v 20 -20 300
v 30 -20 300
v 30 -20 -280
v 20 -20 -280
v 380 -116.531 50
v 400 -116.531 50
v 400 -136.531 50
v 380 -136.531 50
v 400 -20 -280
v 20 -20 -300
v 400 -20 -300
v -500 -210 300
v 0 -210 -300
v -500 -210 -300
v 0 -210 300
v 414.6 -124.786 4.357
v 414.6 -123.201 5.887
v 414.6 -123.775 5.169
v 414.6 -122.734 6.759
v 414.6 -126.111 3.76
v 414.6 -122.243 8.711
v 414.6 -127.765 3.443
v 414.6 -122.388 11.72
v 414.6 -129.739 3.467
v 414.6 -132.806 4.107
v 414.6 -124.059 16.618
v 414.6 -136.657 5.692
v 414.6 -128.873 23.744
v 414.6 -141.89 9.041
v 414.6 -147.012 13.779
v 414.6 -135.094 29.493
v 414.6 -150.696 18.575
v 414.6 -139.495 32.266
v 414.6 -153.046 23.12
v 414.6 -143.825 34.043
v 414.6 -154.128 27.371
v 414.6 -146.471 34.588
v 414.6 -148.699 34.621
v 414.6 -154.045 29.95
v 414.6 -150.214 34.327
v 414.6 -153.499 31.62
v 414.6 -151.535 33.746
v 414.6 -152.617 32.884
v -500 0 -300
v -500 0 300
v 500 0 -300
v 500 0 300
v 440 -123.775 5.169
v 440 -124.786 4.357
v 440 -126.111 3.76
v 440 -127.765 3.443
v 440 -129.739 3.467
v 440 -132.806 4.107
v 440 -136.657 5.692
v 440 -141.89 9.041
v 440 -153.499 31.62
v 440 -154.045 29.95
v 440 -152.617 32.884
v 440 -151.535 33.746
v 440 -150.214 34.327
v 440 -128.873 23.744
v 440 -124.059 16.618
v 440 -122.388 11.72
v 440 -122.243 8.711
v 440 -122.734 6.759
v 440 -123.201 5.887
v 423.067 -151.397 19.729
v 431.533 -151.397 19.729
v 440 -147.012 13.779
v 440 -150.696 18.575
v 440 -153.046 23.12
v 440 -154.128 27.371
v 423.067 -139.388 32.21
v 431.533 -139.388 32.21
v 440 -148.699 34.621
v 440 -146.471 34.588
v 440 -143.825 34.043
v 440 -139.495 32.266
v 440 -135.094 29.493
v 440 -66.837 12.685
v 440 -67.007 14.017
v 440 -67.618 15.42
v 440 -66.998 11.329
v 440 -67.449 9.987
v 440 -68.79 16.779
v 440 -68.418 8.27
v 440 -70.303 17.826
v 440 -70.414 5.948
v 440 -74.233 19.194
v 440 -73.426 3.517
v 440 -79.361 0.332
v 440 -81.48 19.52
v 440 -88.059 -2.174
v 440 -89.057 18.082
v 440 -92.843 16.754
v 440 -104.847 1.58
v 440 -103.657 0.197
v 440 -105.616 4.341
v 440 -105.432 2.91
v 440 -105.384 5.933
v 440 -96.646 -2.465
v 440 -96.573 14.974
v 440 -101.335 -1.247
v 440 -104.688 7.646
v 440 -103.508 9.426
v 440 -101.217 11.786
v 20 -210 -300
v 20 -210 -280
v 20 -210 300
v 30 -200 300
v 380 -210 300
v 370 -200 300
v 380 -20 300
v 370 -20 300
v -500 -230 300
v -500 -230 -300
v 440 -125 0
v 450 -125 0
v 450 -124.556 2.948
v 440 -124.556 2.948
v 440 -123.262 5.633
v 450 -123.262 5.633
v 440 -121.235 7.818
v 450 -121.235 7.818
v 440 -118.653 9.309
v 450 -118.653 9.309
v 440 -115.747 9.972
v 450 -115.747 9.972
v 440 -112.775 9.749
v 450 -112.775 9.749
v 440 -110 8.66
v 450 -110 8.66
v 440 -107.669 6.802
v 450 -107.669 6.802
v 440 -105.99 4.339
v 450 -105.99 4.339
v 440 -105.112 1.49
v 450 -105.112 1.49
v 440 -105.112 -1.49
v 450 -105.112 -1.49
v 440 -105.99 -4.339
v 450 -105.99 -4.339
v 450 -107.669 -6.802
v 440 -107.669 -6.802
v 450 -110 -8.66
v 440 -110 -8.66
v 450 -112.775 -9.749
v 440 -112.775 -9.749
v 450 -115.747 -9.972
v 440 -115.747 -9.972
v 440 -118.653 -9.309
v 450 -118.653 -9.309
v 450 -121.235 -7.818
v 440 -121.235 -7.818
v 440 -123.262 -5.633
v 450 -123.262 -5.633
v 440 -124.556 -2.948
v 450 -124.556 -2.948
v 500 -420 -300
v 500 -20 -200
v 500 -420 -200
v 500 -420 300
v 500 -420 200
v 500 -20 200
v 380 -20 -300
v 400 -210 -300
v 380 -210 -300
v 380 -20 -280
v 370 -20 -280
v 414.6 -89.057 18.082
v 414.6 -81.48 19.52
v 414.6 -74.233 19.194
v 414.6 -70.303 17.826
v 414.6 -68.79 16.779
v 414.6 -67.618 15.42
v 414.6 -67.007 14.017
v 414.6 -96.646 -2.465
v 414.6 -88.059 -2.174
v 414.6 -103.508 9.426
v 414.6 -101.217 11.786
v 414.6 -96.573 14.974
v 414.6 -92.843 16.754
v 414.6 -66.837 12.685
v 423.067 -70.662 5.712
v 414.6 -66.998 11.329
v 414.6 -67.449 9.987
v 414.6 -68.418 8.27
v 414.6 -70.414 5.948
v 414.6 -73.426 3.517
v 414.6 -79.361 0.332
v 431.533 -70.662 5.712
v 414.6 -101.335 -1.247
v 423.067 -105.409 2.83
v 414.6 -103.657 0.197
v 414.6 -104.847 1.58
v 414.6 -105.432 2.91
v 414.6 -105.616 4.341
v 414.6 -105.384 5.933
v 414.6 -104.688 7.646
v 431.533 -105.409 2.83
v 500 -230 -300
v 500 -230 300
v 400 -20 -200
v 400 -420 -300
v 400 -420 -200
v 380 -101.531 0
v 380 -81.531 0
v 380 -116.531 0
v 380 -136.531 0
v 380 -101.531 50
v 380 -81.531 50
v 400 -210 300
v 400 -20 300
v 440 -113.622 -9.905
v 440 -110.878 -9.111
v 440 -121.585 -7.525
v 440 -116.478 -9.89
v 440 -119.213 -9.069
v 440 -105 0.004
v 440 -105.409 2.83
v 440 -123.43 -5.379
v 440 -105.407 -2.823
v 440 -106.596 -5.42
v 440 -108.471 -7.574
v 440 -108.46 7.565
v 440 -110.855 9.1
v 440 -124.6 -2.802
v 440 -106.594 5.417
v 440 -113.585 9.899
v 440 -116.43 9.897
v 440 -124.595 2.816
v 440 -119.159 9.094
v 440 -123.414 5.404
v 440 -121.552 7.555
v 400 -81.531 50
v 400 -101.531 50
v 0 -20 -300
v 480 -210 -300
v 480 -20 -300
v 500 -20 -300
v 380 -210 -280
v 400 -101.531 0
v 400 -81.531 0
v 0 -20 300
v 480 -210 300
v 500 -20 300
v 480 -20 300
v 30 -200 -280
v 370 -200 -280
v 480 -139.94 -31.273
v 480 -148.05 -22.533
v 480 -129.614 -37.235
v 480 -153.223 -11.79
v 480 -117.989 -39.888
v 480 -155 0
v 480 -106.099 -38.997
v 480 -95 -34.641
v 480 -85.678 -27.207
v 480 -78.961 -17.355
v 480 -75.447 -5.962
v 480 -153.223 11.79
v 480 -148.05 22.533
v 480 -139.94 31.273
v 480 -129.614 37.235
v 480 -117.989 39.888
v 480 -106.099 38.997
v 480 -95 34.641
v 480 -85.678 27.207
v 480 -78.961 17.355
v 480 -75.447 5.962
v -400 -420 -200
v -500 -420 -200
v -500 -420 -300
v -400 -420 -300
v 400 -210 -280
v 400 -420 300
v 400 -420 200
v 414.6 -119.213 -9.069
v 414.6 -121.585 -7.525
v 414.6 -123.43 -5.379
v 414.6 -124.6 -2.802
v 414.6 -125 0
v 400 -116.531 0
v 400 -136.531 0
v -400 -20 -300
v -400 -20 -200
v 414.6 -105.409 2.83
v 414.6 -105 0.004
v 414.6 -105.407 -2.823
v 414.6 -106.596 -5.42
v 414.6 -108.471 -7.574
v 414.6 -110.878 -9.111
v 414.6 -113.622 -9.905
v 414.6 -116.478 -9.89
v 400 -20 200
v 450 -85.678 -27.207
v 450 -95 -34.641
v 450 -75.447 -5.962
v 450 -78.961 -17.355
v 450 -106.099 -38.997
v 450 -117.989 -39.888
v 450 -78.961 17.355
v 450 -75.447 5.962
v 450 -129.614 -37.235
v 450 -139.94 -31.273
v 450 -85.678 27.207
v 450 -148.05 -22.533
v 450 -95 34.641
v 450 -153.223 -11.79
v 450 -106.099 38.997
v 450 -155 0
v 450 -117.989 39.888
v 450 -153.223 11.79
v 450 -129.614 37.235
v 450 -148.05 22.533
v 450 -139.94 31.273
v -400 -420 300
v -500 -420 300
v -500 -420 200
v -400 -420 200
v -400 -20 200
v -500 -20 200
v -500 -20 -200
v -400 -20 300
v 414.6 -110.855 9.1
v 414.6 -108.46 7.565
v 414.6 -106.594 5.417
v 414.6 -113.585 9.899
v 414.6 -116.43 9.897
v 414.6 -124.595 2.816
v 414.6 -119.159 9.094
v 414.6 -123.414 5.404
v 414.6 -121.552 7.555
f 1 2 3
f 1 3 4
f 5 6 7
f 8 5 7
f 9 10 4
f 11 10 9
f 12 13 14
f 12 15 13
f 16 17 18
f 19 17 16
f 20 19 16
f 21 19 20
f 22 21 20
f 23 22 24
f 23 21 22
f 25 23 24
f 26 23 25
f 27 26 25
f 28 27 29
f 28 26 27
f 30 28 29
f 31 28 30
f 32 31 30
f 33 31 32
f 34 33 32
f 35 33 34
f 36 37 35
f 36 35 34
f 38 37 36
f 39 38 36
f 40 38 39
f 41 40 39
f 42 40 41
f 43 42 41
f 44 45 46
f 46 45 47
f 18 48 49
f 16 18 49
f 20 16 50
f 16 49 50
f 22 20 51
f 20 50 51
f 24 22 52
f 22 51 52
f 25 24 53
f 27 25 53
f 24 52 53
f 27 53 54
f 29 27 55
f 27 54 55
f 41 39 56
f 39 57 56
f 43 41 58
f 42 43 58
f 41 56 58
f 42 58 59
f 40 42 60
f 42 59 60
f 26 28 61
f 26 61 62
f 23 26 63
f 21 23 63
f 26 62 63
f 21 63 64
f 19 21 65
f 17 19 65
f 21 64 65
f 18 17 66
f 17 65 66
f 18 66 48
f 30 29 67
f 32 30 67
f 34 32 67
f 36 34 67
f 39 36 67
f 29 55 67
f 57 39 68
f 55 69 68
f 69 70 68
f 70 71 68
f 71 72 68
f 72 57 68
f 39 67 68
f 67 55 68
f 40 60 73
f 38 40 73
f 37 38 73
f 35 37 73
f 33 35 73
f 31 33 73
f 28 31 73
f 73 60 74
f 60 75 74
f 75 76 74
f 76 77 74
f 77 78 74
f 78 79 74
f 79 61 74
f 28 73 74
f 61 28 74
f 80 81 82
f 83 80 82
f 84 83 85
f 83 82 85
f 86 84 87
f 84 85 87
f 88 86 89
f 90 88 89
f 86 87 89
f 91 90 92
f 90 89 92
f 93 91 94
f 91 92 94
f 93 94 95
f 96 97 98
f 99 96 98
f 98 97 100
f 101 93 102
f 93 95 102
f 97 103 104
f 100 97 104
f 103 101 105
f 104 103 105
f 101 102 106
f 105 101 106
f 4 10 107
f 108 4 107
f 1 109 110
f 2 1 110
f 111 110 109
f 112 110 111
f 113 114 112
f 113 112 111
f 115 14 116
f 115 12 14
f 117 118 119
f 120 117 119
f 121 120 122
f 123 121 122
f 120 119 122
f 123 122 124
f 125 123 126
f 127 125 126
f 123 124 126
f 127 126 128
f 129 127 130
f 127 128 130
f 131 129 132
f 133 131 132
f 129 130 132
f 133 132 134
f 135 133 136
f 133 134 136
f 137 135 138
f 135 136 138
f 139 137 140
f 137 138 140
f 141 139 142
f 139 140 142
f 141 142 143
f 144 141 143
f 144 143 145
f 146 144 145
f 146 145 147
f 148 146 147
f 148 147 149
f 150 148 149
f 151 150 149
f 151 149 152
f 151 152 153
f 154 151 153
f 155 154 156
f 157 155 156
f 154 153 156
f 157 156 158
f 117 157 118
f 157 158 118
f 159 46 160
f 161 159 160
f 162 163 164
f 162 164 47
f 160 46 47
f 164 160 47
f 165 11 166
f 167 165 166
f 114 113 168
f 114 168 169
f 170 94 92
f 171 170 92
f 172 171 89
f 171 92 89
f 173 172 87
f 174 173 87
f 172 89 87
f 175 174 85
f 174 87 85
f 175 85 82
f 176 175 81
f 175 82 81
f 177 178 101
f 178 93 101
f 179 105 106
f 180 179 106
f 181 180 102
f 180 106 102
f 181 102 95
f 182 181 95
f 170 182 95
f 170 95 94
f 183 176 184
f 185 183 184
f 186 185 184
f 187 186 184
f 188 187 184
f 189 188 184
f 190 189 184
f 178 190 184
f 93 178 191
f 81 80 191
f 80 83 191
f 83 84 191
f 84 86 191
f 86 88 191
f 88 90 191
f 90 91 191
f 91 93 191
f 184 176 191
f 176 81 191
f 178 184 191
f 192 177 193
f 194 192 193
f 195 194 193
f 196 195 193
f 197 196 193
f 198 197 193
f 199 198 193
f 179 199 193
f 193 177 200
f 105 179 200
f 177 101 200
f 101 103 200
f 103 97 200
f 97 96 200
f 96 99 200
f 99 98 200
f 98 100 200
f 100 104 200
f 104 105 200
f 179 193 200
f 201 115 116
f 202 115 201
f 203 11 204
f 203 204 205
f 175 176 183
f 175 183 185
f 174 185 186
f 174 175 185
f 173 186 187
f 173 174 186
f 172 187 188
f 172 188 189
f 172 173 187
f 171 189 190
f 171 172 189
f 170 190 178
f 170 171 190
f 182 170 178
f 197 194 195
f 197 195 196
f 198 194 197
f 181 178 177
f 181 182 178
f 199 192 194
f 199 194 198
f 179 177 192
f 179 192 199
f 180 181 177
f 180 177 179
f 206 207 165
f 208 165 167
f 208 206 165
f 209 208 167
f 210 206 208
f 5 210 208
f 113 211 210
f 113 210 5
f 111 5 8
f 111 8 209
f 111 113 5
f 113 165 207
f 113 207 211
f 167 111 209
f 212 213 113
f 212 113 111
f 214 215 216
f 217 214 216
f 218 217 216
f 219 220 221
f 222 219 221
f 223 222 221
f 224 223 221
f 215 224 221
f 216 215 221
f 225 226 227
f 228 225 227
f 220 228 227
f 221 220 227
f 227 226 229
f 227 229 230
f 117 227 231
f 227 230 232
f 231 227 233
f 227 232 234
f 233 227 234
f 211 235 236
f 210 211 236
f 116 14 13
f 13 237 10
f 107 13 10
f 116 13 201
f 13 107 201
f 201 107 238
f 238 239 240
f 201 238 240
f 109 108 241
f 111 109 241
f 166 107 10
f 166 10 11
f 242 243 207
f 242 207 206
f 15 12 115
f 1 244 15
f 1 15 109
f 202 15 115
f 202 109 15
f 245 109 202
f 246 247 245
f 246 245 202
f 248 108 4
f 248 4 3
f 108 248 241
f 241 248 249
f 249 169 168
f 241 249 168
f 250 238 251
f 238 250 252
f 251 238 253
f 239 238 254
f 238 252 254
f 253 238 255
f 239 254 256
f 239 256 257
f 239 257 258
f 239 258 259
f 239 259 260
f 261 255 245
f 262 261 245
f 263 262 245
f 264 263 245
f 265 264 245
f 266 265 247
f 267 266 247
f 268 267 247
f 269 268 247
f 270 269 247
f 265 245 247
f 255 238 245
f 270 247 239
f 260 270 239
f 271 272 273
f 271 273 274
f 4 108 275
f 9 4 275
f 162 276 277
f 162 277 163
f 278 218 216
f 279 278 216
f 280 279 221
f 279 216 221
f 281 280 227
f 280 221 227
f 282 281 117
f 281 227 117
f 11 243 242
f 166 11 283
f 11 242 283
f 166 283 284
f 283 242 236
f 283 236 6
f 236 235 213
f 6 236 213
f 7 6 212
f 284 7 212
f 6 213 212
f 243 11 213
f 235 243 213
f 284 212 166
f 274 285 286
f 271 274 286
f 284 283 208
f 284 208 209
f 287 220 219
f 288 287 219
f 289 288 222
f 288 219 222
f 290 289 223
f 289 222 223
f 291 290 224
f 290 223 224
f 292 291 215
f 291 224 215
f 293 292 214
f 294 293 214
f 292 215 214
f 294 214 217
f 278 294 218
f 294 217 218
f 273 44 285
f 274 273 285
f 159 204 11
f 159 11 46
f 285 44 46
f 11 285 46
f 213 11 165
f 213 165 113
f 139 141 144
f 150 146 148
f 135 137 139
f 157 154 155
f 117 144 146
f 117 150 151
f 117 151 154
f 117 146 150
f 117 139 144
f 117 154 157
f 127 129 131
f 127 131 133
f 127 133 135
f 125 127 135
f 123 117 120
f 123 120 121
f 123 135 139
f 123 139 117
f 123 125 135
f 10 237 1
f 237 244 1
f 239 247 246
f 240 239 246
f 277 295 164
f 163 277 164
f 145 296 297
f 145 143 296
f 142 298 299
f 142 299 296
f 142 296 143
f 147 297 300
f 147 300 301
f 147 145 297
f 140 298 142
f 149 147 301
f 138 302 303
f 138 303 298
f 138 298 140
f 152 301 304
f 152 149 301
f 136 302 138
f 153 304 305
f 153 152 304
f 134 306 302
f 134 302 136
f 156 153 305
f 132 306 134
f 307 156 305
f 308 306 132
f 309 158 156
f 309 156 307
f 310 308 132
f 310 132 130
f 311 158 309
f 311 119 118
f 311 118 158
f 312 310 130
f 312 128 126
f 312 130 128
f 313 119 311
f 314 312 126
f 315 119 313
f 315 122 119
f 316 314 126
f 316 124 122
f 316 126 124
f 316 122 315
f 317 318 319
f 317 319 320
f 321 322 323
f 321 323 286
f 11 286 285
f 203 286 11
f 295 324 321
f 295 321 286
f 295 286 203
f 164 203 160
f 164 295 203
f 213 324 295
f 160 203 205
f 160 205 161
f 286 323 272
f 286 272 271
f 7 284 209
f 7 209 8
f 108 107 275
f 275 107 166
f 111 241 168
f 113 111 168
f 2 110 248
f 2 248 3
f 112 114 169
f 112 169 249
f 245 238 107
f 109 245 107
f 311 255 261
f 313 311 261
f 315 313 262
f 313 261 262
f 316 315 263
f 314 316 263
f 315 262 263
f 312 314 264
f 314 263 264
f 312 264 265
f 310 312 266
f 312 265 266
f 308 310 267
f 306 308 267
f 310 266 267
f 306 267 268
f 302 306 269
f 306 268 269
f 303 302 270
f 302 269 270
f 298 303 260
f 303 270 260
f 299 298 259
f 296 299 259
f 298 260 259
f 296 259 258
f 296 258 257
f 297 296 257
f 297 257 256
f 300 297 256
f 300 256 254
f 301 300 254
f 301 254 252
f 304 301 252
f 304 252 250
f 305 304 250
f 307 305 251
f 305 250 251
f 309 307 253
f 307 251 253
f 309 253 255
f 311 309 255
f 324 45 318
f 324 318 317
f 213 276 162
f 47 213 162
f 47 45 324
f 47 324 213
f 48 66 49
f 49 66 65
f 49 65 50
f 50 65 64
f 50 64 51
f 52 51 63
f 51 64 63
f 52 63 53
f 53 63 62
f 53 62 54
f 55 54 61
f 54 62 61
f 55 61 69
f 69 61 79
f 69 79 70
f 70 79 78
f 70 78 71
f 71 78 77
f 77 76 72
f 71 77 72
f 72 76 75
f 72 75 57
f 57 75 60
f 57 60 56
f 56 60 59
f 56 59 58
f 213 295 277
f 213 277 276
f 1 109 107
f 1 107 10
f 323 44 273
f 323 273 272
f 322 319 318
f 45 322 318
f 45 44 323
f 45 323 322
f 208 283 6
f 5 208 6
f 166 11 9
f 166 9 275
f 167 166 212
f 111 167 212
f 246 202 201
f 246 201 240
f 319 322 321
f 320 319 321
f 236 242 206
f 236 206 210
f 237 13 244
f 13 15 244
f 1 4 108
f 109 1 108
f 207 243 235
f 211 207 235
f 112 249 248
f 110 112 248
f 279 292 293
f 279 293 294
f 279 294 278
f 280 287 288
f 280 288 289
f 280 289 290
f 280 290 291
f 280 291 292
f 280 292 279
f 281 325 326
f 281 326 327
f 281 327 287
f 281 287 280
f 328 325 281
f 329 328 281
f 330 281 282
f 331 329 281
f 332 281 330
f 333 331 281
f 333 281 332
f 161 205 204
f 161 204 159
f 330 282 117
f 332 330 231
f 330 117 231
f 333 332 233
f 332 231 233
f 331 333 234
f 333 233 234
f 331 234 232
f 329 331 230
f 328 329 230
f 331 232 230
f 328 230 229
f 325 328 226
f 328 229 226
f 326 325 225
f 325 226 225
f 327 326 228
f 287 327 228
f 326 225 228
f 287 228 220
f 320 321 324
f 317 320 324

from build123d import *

# Parameters (mm, degrees)
F0_W      = 1000
F0_H      = 600
F1_DEPTH  = 20
F2_W      = 100
F2_H      = 100
F3_DEPTH  = 400
F4_W      = 20
F4_H      = 190
F5_DEPTH  = 300
F6_R      = 40
F7_DEPTH  = 30
F8_R      = 10
F9_DEPTH  = 10
F11_DEPTH = 25.4
F13_DEPTH = 25.4
F14_W     = 190
F14_H     = 600
F14_W_2   = 20
F14_H_2   = 50
F15_DEPTH = 20
F16_W     = 380
F16_H     = 190
F17_DEPTH = 20
F19_DEPTH = 580


# Not quite as in the source:
# - the program builds the solid bodies; features that only make, move or delete a surface that nothing else refers to are left out


with BuildPart() as f1:
    # F0 (on Front) → F1 (new body)
    with BuildSketch(Plane.XZ):
        Rectangle(F0_W, F0_H)
    extrude(amount=F1_DEPTH)

    # F2 (on face) → F3 (join)
    with BuildSketch(Plane.XZ.offset(20)):
        with Locations((450, 250)):
            Rectangle(F2_W, F2_H)
        with Locations((-450, 250)):
            Rectangle(F2_W, F2_H)
        with Locations((450, -250)):
            Rectangle(F2_W, F2_H)
        with Locations((-450, -250)):
            Rectangle(F2_W, F2_H)
    extrude(amount=F3_DEPTH)


with BuildPart() as f5:
    # F4 (on Top) → F5 (new body, symmetric)
    with BuildSketch(Plane.XY):
        Polygon((0, -210), (-500, -210), (-500, -230), (500, -230), (500, -210), (480, -210), (20, -210), align=None)
        with Locations((10, -115)):
            Rectangle(F4_W, F4_H)
        with Locations((490, -115)):
            Rectangle(F4_W, F4_H)
    extrude(amount=F5_DEPTH, both=True)

    # F6 (on face) → F7 (join)
    with BuildSketch(Plane(origin=(480, 0, 0), x_dir=(0, -1, 0), z_dir=(-1, 0, 0))):
        with Locations((115, 0)):
            Circle(F6_R)
    extrude(amount=F7_DEPTH)

    # F8 (on face) → F9 (join)
    with BuildSketch(Plane(origin=(450, 0, 0), x_dir=(0, -1, 0), z_dir=(-1, 0, 0))):
        with Locations((115, 0)):
            Circle(F8_R)
    extrude(amount=F9_DEPTH)


with BuildPart() as f11:
    # F10 (on face) → F11 (new body)
    with BuildSketch(Plane(origin=(440, 0, 0), x_dir=(0, -1, 0), z_dir=(-1, 0, 0))):
        with BuildLine():
            add(Edge.make_bspline(
                [(105.4089282888, 2.8304316686), (108.23936003, 12.4215025071), (89.0572192774, 18.0823691218)],
                knots=[3.1415927352, 3.1415927352, 3.1415927352, 4.7123889804, 4.7123889804, 4.7123889804], degree=2, weights=[1, 0.7071068101, 1]))
            add(Edge.make_bspline(
                [(89.0572192774, 18.0823691218), (42.7474284625, 31.7489119828), (70.6615445509, 5.712223564), (98.5756606394, -20.3244648547), (105.4089282888, 2.8304316686)],
                knots=[4.7123889804, 4.7123889804, 4.7123889804, 7.0685835114, 7.0685835114, 9.4247780424, 9.4247780424, 9.4247780424], degree=2, weights=[1, 0.3826834135, 1, 0.3826834135, 1]))
        make_face()
    extrude(amount=F11_DEPTH)


with BuildPart() as f11b:
    # F10 (on face) → F11, piece 2 (new body)
    with BuildSketch(Plane(origin=(440, 0, 0), x_dir=(0, -1, 0), z_dir=(-1, 0, 0))):
        with BuildLine():
            add(Edge.make_bspline(
                [(123.7749888492, 5.1688648912), (135.7843636375, -7.3121173295), (151.397371578, 19.7292210814), (167.0103795184, 46.7705594923), (139.3879967896, 32.2102033021), (111.7656140609, 17.6498471119), (123.7749888492, 5.1688648912)],
                knots=[0, 0, 0, 2.0943951024, 2.0943951024, 4.1887902048, 4.1887902048, 6.2831853072, 6.2831853072, 6.2831853072], degree=2, weights=[1, 0.5, 1, 0.5, 1, 0.5, 1]))
        make_face()
    extrude(amount=F11_DEPTH)


with BuildPart() as f13:
    # F10 (on face) → F13 (new body)
    with BuildSketch(Plane(origin=(440, 0, 0), x_dir=(0, -1, 0), z_dir=(-1, 0, 0))):
        with BuildLine():
            ThreePointArc((125, 0), (116.4299095929, 9.8972399464), (105.4089282888, 2.8304316686))
            ThreePointArc((105.4089282888, 2.8304316686), (108.4708790022, -7.5743368684), (119.2133449098, -9.0690531298))
            ThreePointArc((119.2133449098, -9.0690531298), (123.4301082169, -5.3789660206), (125, 0))
        make_face()
    extrude(amount=F13_DEPTH)


with BuildPart() as f15:
    # F14 (on face) → F15 (new body)
    with BuildSketch(Plane(origin=(400, 0, 0), x_dir=(0, -1, 0), z_dir=(-1, 0, 0))):
        with Locations((115, 0)):
            Rectangle(F14_W, F14_H)
        with Locations((91.530764699, 25)):
            Rectangle(F14_W_2, F14_H_2, mode=Mode.SUBTRACT)
        with Locations((126.530764699, 25)):
            Rectangle(F14_W_2, F14_H_2, mode=Mode.SUBTRACT)
    extrude(amount=F15_DEPTH)


with BuildPart() as f17:
    # F16 (on face) → F17 (new body)
    with BuildSketch(Plane(origin=(0, 0, -300), x_dir=(1, 0, 0), z_dir=(0, 0, -1))):
        with Locations((210, 115)):
            Rectangle(F16_W, F16_H)
    extrude(amount=-F17_DEPTH)


with BuildPart() as f19:
    # F18 (on face) → F19 (new body)
    with BuildSketch(Plane.XY.offset(-280)):
        Polygon((30, -20), (20, -20), (20, -210), (380, -210), (380, -20), (370, -20), (370, -200), (30, -200), align=None)
    extrude(amount=F19_DEPTH)


solid = Compound([f1.part, f5.part, f11.part, f11b.part, f13.part, f15.part, f17.part, f19.part])
